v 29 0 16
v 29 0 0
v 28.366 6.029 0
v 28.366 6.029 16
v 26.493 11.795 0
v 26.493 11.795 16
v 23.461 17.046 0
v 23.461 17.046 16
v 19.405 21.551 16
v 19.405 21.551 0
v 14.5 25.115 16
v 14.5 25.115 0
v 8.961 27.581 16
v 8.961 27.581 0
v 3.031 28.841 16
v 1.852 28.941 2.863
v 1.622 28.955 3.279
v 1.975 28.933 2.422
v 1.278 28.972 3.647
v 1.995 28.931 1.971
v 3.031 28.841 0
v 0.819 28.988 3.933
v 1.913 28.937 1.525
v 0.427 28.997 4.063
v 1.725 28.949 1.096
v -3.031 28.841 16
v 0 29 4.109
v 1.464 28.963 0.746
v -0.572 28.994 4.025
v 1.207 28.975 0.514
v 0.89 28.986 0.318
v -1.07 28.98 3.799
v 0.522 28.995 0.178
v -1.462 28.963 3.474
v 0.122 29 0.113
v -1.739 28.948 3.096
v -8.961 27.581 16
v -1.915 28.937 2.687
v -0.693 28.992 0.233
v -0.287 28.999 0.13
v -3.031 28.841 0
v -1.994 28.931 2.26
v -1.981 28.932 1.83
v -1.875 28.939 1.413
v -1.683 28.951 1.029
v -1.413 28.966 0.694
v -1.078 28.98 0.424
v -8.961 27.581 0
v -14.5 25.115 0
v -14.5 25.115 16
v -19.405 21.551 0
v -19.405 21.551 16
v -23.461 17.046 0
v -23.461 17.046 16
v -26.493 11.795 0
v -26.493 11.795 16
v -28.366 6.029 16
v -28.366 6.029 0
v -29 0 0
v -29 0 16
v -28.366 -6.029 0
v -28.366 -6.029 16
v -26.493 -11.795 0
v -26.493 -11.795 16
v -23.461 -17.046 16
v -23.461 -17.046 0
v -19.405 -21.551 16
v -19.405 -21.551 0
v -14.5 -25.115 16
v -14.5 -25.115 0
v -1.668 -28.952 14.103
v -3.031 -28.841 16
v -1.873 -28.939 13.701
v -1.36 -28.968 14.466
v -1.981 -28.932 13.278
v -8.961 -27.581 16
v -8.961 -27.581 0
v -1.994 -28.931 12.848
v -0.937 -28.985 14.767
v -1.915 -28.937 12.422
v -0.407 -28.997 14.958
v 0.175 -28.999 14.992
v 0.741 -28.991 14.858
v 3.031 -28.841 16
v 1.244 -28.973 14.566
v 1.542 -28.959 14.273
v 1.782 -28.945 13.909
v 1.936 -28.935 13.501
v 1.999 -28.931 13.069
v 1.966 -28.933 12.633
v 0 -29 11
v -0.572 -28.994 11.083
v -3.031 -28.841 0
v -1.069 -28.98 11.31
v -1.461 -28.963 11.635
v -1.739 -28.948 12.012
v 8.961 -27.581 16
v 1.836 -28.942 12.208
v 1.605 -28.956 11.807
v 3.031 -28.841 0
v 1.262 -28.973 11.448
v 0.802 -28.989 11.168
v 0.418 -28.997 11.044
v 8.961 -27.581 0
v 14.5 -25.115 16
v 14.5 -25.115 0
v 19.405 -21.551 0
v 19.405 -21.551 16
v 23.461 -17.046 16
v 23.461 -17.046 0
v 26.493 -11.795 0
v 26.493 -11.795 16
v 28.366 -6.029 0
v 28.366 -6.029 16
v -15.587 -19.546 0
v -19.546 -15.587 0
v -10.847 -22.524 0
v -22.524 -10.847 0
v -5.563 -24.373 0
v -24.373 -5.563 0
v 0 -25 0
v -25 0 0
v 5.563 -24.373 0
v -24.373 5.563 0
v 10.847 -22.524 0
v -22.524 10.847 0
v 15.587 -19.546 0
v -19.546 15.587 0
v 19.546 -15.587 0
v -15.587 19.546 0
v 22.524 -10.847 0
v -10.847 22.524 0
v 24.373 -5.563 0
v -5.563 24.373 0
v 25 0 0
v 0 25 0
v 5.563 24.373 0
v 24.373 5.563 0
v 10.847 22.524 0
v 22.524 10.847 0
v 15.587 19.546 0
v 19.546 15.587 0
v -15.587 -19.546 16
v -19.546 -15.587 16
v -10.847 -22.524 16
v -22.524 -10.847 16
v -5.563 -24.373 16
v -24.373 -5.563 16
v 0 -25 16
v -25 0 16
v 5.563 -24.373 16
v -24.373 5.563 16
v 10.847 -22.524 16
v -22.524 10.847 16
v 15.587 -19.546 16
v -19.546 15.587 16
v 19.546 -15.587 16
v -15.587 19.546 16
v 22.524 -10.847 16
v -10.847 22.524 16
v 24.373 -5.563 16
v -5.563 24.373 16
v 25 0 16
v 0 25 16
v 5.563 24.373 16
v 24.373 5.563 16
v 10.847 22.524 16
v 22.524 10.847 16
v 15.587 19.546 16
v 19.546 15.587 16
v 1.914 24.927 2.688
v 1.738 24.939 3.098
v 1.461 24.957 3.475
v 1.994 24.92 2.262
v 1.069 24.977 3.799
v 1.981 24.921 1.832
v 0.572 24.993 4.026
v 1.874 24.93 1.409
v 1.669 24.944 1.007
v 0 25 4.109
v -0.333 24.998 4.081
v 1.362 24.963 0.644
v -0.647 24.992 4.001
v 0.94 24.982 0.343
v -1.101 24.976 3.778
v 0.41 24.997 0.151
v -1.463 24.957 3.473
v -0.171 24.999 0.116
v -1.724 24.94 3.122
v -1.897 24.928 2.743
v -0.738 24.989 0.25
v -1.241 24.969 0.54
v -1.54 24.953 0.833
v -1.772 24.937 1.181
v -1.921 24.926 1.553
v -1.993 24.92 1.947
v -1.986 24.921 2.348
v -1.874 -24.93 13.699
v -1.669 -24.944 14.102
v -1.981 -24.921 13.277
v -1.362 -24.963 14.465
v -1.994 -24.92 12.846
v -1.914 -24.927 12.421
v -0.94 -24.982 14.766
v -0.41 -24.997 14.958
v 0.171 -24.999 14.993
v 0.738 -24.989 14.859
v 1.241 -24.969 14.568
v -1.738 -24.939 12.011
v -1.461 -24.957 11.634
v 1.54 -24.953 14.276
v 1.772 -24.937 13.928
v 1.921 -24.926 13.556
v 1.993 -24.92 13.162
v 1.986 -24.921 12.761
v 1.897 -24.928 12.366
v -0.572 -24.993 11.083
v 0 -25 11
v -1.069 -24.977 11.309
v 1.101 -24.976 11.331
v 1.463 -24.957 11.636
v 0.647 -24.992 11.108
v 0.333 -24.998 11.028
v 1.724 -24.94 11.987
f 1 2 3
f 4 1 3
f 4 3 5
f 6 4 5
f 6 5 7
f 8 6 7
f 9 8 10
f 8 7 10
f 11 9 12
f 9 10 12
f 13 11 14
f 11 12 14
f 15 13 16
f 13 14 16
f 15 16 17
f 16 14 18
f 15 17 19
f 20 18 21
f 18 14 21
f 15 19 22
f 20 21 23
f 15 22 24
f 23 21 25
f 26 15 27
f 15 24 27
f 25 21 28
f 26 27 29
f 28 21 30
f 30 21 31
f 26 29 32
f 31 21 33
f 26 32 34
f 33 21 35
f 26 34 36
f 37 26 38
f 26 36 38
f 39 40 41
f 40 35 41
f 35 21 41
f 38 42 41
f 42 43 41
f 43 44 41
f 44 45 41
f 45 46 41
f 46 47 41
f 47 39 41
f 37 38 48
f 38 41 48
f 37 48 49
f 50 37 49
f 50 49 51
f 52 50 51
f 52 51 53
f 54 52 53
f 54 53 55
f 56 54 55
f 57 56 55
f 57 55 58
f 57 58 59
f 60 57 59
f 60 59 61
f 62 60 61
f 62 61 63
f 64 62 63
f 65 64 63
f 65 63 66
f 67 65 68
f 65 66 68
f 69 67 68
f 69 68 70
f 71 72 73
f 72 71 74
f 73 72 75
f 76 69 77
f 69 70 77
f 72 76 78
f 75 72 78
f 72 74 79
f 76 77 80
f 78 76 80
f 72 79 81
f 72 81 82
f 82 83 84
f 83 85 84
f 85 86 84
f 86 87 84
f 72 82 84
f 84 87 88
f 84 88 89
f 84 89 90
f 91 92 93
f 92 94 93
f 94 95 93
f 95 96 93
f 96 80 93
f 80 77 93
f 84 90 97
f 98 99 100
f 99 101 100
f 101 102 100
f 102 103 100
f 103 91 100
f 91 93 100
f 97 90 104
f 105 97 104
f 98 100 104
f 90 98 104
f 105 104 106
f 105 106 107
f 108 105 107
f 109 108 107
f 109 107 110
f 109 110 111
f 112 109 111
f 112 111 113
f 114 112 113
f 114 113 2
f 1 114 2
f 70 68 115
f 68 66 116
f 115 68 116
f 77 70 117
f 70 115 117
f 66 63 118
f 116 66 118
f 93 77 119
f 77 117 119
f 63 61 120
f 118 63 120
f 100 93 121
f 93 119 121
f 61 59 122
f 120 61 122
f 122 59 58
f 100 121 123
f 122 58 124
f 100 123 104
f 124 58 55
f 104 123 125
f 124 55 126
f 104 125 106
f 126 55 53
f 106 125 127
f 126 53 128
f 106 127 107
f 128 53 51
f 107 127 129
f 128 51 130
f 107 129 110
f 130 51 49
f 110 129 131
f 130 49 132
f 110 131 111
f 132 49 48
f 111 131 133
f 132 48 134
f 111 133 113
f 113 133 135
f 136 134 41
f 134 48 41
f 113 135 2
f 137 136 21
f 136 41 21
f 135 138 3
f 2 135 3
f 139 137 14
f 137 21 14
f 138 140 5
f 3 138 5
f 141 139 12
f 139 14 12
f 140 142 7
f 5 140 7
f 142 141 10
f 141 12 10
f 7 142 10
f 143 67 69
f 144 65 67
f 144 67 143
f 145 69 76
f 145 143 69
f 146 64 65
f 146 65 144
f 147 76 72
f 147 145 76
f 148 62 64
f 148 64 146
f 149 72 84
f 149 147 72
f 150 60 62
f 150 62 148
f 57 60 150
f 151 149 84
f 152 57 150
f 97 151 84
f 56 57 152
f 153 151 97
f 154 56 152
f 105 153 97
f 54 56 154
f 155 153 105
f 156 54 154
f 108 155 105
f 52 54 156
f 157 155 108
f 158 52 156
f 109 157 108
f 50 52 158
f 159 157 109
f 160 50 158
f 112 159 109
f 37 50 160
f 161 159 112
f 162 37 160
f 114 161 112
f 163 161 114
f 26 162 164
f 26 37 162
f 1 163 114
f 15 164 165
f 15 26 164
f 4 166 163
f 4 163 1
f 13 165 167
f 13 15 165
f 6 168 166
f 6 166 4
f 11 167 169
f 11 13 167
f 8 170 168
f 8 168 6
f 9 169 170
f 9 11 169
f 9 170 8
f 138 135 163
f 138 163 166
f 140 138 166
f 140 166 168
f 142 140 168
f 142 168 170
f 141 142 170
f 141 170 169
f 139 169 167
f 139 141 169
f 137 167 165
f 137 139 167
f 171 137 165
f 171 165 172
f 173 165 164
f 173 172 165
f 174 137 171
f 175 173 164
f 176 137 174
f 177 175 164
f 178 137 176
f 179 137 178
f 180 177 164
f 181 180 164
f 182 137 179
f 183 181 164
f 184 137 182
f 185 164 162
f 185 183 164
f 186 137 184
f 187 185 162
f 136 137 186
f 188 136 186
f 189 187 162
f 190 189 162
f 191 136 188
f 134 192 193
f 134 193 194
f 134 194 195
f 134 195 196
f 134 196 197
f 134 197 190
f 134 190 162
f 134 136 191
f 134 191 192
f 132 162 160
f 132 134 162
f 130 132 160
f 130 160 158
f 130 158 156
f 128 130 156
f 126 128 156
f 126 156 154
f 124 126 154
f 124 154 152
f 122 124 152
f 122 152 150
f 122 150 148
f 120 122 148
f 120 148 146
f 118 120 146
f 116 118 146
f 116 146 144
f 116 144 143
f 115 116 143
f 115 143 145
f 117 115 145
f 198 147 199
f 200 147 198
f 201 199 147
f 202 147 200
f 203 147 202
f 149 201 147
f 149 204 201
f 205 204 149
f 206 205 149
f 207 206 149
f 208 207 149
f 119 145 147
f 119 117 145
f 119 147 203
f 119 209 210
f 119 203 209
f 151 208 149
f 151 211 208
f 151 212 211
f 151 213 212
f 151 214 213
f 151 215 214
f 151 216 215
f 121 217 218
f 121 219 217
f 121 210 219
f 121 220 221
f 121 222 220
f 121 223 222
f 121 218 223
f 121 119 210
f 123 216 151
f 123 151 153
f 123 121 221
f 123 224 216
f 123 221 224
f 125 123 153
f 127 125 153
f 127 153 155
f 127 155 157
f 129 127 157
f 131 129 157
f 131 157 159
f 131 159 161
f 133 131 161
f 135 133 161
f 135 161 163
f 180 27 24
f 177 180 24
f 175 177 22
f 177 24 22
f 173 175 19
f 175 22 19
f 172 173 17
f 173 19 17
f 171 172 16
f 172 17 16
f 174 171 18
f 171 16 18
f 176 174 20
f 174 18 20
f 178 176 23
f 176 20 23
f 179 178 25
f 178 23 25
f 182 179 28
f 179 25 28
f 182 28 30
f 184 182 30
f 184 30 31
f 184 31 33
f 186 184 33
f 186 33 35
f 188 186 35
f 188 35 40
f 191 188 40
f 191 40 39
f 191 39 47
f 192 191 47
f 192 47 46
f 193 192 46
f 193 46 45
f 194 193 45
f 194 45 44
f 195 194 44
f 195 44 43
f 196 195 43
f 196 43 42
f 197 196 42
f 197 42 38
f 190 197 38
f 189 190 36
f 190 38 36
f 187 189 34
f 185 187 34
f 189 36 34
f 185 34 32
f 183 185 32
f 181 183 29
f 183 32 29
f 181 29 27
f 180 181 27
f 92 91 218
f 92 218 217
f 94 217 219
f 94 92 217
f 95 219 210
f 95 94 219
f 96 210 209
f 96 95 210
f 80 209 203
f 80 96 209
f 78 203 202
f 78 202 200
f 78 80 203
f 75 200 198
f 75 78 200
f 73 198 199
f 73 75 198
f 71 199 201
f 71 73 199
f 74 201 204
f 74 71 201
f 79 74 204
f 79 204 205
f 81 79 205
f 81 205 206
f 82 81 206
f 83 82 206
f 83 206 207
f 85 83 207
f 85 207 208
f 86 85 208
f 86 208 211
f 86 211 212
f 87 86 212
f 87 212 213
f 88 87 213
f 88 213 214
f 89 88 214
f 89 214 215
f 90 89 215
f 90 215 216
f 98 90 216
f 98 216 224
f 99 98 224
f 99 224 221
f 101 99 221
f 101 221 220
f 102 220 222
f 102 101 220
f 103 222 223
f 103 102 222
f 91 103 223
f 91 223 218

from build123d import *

# Parameters (mm, degrees)
SKETCH1_R           = 29
SKETCH1_R_2         = 25
BOSS_EXTRUDE1_DEPTH = 16
SKETCH3_R           = 2
CUT_EXTRUDE1_DEPTH  = 16
SKETCH4_R           = 2
CUT_EXTRUDE2_DEPTH  = 16


with BuildPart() as part:
    # Sketch1 → Boss-Extrude1 (new body)
    with BuildSketch(Plane.XY):
        Circle(SKETCH1_R)
        Circle(SKETCH1_R_2, mode=Mode.SUBTRACT)
    extrude(amount=BOSS_EXTRUDE1_DEPTH)

    # Sketch3 → Cut-Extrude1 (cut)
    with BuildSketch(Plane(origin=(0, 29, 0), x_dir=(1, 0, 0), z_dir=(0, 1, 0))):
        with Locations(Location((0, -2.108912796, 0), (0, 0, 270))):
            Circle(SKETCH3_R)
    extrude(amount=-CUT_EXTRUDE1_DEPTH, mode=Mode.SUBTRACT)

    # Sketch4 → Cut-Extrude2 (cut)
    with BuildSketch(Plane(origin=(0, -29, 0), x_dir=(1, 0, 0), z_dir=(0, 1, 0))):
        with Locations(Location((0, -13, 0), (0, 0, 90))):
            Circle(SKETCH4_R)
    extrude(amount=CUT_EXTRUDE2_DEPTH, mode=Mode.SUBTRACT)


solid = part.part
